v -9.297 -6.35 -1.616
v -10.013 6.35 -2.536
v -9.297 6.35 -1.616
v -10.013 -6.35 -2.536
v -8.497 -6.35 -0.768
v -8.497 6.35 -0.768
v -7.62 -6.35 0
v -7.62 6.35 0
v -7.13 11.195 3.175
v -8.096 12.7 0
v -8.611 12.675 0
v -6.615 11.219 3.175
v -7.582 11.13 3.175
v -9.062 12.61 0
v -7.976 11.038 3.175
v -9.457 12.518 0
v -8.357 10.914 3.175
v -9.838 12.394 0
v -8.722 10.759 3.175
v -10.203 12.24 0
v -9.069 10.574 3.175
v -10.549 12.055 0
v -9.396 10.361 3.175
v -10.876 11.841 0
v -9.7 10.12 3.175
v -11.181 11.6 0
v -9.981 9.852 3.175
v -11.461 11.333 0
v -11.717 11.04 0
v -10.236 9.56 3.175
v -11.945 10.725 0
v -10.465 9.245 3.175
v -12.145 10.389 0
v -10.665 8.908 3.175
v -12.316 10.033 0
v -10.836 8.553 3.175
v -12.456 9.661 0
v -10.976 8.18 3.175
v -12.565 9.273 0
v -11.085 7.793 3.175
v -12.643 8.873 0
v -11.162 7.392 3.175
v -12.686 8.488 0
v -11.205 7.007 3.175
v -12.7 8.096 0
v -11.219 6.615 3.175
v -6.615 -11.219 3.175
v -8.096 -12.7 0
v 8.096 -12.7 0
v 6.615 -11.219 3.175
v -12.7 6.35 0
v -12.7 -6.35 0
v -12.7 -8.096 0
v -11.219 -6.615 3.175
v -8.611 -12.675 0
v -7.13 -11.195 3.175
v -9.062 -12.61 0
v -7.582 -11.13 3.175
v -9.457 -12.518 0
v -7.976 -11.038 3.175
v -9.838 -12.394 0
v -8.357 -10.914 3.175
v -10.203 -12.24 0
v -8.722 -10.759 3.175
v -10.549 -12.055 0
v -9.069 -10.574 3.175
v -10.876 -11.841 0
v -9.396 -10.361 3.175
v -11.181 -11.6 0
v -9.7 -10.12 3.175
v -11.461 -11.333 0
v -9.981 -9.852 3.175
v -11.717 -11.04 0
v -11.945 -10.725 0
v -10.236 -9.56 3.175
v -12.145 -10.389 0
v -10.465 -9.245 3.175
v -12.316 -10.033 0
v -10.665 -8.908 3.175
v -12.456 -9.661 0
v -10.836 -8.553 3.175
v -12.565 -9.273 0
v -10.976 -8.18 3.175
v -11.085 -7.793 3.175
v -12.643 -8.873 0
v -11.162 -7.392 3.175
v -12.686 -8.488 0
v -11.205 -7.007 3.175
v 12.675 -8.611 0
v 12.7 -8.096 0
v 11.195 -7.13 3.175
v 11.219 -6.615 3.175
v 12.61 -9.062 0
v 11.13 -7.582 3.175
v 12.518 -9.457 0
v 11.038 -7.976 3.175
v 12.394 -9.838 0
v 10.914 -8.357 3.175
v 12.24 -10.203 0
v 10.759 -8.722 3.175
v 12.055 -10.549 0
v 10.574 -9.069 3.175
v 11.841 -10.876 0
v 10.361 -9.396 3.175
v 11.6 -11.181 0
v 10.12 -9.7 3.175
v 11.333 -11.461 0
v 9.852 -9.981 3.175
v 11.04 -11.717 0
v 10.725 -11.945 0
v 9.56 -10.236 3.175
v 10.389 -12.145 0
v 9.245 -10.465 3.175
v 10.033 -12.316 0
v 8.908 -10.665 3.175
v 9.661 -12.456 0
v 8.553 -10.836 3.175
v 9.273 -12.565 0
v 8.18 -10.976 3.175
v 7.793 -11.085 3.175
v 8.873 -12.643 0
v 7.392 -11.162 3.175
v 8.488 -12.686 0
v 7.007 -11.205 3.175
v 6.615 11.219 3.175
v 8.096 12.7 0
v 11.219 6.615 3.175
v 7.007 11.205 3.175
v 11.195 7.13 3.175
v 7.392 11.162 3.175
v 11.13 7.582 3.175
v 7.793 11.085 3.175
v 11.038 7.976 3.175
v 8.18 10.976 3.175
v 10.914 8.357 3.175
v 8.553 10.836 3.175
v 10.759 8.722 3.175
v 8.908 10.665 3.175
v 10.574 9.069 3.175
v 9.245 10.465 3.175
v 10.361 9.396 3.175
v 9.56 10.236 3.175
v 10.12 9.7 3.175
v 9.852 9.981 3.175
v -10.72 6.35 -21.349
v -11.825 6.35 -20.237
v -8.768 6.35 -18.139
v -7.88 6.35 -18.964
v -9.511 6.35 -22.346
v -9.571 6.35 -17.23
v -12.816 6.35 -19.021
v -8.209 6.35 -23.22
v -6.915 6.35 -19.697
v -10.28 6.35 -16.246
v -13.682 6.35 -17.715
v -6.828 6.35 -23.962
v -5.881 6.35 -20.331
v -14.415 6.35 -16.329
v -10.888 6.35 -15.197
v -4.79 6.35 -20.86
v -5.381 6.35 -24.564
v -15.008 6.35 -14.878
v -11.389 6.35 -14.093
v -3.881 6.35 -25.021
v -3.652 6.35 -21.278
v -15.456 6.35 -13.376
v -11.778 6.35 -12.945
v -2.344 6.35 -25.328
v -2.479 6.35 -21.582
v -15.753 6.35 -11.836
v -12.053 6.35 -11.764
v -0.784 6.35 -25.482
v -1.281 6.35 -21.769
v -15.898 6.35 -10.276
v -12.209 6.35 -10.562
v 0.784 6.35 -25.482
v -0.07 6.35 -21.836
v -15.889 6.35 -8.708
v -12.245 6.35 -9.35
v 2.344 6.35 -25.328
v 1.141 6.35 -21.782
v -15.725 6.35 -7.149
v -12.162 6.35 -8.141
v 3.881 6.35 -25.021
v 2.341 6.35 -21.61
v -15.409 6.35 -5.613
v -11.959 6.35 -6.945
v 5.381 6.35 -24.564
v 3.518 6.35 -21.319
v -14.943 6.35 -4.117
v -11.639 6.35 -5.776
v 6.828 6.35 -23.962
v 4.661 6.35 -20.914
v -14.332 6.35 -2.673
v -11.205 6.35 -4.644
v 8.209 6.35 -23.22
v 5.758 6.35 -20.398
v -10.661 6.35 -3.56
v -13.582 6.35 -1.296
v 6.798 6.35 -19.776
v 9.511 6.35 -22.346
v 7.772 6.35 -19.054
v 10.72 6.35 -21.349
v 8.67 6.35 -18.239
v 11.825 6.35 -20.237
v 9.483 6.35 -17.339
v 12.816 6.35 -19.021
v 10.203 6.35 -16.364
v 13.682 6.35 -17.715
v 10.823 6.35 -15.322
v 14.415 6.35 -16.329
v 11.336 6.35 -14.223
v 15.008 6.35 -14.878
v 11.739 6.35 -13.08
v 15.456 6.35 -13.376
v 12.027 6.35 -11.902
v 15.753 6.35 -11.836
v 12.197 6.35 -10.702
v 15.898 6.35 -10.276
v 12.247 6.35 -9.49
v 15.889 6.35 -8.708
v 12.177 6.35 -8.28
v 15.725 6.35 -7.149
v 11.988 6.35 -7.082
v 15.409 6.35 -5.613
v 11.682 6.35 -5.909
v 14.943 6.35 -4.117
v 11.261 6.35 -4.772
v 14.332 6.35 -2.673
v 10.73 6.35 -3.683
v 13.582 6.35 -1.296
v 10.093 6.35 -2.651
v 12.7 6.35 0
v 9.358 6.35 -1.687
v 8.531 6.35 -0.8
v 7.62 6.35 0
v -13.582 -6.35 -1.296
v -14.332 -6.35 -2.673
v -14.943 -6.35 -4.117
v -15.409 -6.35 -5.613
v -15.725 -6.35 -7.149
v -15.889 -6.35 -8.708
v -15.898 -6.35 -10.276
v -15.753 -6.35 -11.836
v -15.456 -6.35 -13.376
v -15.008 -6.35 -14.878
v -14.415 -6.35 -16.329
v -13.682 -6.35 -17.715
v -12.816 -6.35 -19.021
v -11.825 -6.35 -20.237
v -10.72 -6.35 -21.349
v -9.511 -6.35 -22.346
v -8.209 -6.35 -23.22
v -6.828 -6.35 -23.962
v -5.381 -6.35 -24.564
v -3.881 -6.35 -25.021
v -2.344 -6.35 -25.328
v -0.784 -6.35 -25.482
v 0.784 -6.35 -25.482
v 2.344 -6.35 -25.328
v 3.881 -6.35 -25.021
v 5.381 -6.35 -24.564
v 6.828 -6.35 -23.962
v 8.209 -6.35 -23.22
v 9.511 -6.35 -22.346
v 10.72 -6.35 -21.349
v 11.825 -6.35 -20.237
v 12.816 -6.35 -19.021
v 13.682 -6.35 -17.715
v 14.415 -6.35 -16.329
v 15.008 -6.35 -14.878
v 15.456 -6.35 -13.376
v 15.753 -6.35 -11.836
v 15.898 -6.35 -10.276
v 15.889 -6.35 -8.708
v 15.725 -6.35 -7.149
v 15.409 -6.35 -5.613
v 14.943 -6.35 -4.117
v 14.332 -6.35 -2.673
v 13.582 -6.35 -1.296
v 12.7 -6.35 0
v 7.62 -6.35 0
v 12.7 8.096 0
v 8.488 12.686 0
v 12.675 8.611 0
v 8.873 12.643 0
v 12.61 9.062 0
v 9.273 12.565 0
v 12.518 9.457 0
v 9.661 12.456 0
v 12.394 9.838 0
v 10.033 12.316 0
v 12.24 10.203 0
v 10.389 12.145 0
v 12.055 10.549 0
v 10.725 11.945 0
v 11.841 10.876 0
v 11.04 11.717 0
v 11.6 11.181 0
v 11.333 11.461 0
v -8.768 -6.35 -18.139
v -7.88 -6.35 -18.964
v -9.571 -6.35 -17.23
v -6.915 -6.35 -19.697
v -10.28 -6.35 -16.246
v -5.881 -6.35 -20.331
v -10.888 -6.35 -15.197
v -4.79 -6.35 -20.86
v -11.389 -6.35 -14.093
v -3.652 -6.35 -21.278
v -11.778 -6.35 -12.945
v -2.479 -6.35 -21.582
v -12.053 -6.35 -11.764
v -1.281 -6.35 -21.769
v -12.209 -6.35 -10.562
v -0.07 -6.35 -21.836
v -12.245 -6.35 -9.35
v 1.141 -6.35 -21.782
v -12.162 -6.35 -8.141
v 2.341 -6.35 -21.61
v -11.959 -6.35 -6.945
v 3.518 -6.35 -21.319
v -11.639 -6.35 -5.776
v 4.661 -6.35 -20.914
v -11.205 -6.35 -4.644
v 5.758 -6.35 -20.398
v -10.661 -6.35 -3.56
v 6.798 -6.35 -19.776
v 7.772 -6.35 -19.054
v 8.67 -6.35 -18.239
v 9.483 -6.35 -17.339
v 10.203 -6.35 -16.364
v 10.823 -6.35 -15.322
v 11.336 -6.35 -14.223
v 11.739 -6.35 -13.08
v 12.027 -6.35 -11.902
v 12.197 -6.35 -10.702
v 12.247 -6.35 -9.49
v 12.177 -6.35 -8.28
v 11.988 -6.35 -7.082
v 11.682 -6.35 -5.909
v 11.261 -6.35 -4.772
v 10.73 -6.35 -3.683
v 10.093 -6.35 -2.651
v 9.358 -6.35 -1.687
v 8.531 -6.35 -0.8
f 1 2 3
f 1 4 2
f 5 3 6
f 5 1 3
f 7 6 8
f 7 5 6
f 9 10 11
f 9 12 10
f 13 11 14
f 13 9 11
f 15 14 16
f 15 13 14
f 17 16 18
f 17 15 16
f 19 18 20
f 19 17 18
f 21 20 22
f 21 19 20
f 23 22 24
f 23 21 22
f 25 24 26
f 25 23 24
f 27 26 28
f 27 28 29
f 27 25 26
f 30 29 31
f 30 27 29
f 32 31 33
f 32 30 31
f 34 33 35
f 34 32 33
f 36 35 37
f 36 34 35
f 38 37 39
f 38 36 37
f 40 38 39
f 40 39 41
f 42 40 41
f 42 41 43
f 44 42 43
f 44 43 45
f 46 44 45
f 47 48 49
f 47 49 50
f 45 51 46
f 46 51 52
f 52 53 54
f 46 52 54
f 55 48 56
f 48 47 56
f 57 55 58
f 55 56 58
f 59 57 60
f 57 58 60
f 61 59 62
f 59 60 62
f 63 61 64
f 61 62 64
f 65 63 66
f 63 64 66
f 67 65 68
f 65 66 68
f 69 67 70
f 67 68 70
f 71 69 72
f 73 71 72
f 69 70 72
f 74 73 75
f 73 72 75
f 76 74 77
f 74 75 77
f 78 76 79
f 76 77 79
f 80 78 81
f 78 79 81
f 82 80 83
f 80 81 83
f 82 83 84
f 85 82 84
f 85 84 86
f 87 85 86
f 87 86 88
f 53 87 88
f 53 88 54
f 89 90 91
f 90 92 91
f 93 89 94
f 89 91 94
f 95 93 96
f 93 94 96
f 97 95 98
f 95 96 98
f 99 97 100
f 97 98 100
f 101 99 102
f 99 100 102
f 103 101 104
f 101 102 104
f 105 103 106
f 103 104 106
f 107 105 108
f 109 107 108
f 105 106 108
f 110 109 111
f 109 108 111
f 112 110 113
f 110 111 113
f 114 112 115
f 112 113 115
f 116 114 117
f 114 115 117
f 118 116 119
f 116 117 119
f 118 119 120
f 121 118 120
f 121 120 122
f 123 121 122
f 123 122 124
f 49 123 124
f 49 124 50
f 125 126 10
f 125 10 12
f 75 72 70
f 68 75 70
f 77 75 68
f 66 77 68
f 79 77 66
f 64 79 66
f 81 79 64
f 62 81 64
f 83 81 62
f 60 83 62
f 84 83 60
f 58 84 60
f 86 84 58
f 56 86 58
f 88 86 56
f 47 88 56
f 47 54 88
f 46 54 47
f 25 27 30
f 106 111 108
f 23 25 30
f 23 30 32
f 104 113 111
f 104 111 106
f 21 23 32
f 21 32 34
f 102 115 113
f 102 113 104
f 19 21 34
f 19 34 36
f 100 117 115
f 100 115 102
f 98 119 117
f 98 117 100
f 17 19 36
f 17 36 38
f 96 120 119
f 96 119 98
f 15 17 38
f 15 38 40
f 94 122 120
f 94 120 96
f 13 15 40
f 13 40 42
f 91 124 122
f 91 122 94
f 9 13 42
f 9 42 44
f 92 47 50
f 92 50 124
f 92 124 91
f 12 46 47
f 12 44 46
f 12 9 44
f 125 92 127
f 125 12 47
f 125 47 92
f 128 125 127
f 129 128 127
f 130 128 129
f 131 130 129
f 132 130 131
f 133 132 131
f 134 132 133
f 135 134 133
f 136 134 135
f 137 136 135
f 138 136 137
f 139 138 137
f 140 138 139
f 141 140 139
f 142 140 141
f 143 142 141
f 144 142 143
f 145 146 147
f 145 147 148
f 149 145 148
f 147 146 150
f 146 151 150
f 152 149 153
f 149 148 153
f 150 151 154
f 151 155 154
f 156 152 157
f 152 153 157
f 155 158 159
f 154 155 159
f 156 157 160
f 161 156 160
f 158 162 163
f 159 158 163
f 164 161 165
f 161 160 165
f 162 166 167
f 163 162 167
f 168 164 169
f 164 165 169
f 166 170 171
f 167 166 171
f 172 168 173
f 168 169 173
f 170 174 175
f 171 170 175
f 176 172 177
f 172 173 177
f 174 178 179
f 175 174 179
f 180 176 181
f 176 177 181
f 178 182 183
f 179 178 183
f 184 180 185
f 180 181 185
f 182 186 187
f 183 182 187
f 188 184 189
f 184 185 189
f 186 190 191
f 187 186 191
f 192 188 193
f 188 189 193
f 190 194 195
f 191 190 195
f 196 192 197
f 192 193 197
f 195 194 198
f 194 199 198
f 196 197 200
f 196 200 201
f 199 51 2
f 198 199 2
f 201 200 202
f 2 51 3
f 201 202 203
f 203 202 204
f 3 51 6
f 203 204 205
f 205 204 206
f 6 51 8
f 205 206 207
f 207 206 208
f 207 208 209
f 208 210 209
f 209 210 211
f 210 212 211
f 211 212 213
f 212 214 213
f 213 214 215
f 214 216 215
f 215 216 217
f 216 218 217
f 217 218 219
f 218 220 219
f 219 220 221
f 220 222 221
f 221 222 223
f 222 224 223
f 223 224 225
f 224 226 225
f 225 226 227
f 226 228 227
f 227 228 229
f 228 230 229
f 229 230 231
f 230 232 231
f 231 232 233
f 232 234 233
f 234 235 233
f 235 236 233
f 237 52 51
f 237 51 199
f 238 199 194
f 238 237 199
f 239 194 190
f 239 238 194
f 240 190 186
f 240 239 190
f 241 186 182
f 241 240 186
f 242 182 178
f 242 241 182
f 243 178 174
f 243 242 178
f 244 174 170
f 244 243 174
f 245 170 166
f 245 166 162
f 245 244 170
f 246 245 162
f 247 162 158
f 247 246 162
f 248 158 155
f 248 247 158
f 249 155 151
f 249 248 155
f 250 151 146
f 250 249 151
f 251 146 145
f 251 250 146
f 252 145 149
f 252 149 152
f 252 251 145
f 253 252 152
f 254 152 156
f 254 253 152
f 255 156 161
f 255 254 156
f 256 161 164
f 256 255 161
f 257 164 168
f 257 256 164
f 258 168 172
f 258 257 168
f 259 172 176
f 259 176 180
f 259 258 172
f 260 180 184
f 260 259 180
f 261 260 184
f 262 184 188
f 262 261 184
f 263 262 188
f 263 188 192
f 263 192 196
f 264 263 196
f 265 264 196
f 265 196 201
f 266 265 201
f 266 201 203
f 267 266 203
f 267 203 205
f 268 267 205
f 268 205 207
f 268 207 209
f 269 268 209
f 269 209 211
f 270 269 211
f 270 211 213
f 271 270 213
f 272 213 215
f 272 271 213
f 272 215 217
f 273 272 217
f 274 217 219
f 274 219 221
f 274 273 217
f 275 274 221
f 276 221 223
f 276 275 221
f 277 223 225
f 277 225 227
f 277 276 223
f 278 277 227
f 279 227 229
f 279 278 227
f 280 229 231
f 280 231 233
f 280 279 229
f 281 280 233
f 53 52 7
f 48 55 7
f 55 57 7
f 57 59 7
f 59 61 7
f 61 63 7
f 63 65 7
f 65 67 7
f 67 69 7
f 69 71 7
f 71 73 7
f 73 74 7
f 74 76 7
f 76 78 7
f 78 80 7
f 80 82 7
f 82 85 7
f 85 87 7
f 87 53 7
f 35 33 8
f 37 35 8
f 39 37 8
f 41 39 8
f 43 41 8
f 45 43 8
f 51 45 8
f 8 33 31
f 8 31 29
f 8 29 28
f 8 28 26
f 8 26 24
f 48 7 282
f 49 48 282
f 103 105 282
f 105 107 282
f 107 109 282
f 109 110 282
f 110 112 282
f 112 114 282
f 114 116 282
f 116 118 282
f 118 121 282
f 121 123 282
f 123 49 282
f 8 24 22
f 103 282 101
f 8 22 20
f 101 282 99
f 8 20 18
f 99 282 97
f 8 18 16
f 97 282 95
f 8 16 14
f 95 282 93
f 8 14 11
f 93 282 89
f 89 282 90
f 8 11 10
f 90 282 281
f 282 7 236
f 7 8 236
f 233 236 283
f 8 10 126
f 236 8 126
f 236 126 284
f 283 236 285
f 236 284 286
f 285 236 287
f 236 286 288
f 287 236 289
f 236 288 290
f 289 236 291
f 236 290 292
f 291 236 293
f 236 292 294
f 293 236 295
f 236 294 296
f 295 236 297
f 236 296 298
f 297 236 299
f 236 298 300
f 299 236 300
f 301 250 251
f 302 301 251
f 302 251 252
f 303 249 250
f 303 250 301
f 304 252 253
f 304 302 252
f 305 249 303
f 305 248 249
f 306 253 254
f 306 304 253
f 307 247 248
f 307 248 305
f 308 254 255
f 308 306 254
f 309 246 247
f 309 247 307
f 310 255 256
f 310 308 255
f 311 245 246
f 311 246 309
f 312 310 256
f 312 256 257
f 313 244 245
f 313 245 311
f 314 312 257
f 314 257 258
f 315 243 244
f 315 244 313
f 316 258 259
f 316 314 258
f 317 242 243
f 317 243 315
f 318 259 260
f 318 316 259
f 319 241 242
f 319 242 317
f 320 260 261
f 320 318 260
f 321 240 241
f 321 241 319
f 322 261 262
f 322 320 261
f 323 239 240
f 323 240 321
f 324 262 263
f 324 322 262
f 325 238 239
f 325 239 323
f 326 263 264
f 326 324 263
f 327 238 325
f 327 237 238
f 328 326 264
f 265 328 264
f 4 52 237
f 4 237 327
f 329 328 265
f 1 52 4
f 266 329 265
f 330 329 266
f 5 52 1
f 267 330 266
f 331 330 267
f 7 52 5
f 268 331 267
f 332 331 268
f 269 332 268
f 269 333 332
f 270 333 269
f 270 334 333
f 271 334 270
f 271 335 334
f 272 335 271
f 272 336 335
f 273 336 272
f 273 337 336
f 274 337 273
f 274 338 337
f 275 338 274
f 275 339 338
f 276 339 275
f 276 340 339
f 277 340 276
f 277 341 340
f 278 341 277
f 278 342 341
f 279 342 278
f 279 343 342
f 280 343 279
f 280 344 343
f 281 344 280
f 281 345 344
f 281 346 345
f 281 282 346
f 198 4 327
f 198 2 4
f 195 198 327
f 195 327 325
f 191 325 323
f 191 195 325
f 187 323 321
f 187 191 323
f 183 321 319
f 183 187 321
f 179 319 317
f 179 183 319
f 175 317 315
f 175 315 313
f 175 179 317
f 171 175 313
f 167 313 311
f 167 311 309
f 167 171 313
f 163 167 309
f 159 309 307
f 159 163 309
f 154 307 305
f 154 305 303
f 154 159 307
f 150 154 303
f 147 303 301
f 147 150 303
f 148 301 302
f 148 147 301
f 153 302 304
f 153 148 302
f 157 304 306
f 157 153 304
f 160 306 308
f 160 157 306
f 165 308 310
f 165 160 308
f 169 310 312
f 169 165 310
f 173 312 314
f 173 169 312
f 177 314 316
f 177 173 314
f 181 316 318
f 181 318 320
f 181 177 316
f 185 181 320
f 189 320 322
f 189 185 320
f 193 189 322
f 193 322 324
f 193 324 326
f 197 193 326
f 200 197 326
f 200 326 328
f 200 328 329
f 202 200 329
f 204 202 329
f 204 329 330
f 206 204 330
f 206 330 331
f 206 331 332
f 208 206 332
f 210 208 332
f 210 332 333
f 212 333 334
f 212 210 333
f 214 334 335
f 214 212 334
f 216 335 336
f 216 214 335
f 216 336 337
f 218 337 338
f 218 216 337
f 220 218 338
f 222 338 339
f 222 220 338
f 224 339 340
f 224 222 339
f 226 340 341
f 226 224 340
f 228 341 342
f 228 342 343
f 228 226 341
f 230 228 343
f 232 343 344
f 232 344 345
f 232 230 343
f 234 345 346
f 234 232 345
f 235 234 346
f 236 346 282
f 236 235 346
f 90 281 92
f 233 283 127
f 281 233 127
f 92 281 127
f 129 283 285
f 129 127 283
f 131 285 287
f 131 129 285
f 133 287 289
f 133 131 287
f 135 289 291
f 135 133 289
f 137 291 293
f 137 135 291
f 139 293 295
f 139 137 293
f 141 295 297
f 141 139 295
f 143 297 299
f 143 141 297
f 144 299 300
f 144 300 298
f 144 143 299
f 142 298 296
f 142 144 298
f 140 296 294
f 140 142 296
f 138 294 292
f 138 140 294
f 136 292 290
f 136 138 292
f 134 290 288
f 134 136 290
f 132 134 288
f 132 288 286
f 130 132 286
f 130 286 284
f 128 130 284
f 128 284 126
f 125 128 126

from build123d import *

# Parameters (mm, degrees)
F0_W     = 25.4
F0_H     = 25.4
F1_DEPTH = 3.175
F1_TAPER = 25
F3_W     = 5.08
F3_H     = 12.7
F6_DEPTH = 6.35
F7_R     = 5.08


with BuildPart() as f1:
    # F0 (on Top) → F1 (new body)
    with BuildSketch(Plane.XY):
        Rectangle(F0_W, F0_H)
    extrude(amount=F1_DEPTH, taper=F1_TAPER)

    # F4: sweep along a path in F2
    with BuildLine(Plane.XZ) as f4_path:
        ThreePointArc((-10.16, 0), (0, -23.5582897328), (10.16, 0))
    # F3 (on face) → F4 (sweep)
    with BuildSketch(Plane(origin=(0, 0, 0), x_dir=(1, 0, 0), z_dir=(0, 0, -1))):
        with Locations((10.16, 0)):
            Rectangle(F3_W, F3_H)
    sweep(path=f4_path.line)

    # F5 (on Front) → F6 (join, symmetric)
    with BuildSketch(Plane.XZ):
        with BuildLine():
            Line((-7.62, 0), (-10.16, 0))
            Line((-10.16, 0), (-10.0130578512, -2.535746045))
            ThreePointArc((-10.0130578512, -2.535746045), (-8.9072265211, -1.1822790439), (-7.62, 0))
        make_face()
    extrude(amount=F6_DEPTH, both=True)

    # F7
    f7_edges = [f1.edges().sort_by_distance(p)[0] for p in [
        (-11.959737, 11.959737, 1.5875),
        (11.959737, 11.959737, 1.5875),
        (11.959737, -11.959737, 1.5875),
        (-11.959737, -11.959737, 1.5875),
    ]]
    fillet(f7_edges, radius=F7_R)


solid = f1.part
